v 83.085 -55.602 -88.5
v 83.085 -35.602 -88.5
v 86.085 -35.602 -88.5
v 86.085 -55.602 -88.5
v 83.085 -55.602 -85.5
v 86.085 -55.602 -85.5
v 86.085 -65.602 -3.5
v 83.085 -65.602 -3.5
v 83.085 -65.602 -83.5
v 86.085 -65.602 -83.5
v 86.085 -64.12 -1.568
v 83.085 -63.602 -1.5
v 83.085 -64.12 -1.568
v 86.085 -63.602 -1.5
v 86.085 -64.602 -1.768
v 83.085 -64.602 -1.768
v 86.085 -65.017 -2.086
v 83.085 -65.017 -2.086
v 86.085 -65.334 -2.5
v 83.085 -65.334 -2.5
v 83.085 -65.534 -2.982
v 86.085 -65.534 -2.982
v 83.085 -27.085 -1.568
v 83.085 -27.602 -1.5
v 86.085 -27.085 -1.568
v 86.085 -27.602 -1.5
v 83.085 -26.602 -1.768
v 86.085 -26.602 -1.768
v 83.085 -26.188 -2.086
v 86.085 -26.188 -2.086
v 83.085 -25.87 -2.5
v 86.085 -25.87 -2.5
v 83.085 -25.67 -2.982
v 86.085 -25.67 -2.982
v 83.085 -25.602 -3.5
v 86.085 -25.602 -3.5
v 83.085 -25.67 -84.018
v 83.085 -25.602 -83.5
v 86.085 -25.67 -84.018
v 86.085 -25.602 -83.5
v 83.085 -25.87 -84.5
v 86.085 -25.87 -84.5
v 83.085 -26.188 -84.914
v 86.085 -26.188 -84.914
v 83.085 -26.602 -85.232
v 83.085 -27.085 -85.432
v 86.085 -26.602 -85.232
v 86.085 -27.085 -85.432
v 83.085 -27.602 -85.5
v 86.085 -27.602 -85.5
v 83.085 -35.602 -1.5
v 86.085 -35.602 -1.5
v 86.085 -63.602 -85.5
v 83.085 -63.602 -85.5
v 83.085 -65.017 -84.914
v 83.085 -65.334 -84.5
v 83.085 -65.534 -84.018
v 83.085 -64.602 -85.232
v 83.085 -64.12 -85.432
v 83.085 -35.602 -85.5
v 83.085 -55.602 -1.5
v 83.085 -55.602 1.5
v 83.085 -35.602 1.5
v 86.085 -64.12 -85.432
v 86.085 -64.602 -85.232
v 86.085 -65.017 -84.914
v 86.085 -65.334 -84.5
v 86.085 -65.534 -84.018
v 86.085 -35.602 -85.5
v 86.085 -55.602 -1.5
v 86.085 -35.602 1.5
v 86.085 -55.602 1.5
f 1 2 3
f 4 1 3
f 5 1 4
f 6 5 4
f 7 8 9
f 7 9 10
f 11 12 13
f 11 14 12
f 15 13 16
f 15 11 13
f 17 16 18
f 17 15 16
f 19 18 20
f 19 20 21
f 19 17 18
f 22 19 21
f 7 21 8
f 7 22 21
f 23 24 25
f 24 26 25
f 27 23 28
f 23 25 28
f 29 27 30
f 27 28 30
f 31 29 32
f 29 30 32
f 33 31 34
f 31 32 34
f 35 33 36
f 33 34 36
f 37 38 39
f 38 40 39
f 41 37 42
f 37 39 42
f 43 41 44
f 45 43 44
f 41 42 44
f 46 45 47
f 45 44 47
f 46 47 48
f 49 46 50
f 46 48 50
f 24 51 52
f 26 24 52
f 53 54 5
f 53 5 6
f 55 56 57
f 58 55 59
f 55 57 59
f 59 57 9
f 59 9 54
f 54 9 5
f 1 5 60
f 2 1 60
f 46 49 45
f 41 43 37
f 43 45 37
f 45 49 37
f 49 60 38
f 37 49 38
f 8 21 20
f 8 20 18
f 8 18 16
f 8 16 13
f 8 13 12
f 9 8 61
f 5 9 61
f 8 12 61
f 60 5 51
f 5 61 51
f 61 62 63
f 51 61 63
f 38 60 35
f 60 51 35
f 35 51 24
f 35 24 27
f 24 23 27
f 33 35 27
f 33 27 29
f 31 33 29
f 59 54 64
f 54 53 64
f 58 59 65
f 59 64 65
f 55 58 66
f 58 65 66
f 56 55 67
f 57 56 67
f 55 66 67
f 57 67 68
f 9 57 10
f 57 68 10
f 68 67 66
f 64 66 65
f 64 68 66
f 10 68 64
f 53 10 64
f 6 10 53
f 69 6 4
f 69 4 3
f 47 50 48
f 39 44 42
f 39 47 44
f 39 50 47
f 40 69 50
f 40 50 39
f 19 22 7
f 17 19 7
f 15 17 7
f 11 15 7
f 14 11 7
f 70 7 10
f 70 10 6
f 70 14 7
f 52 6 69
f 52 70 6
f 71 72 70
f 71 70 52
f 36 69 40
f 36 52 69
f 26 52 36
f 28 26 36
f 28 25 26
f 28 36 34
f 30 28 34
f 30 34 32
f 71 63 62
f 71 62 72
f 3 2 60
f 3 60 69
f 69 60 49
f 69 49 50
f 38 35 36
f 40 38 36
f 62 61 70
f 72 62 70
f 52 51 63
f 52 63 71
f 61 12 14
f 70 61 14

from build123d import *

# Parameters (mm, degrees)
SKETCH1_W           = 3
SKETCH1_H           = 40
EXTRUDE_THIN1_DEPTH = 90
CAVITY1_START       = -65.602294015
CAVITY1_OUTLINE_W   = 3
CAVITY1_OUTLINE_H   = 3
CAVITY1_DEPTH       = 10
CAVITY1_START_2     = -35.602294015
CAVITY1_2_OUTLINE_W = 3
CAVITY1_2_OUTLINE_H = 3
CAVITY1_2_DEPTH     = 10
FILLET1_R           = 2


# Read off the part's stored shape, not the designer's step: Cavity1
with BuildPart() as part:
    # Sketch1 → Extrude-Thin1 (new body)
    with BuildSketch(Plane.XY.offset(1.5)):
        with Locations((84.585106383, -45.602294015)):
            Rectangle(SKETCH1_W, SKETCH1_H)
    extrude(amount=-EXTRUDE_THIN1_DEPTH)

    # Cavity1 outline → Cavity1 (cut)
    with BuildSketch(Plane(origin=(0, 0, 0), x_dir=(1, 0, 0), z_dir=(0, 1, 0)).offset(CAVITY1_START)):
        with Locations((84.585106383, 87)):
            Rectangle(CAVITY1_OUTLINE_W, CAVITY1_OUTLINE_H)
        with Locations((84.585106383, 0)):
            Rectangle(CAVITY1_OUTLINE_W, CAVITY1_OUTLINE_H)
    extrude(amount=CAVITY1_DEPTH, mode=Mode.SUBTRACT)

    # Cavity1 2 outline → Cavity1 2 (cut)
    with BuildSketch(Plane(origin=(0, 0, 0), x_dir=(1, 0, 0), z_dir=(0, 1, 0)).offset(CAVITY1_START_2)):
        with Locations((84.585106383, 87)):
            Rectangle(CAVITY1_2_OUTLINE_W, CAVITY1_2_OUTLINE_H)
        with Locations((84.585106383, 0)):
            Rectangle(CAVITY1_2_OUTLINE_W, CAVITY1_2_OUTLINE_H)
    extrude(amount=CAVITY1_2_DEPTH, mode=Mode.SUBTRACT)

    # Fillet1
    fillet1_edges = [part.edges().sort_by_distance(p)[0] for p in [
        (84.585106383, -65.602294015, -85.5),
        (84.585106383, -25.602294015, -85.5),
        (84.585106383, -65.602294015, -1.5),
        (84.585106383, -25.602294015, -1.5),
    ]]
    fillet(fillet1_edges, radius=FILLET1_R)


solid = part.part
